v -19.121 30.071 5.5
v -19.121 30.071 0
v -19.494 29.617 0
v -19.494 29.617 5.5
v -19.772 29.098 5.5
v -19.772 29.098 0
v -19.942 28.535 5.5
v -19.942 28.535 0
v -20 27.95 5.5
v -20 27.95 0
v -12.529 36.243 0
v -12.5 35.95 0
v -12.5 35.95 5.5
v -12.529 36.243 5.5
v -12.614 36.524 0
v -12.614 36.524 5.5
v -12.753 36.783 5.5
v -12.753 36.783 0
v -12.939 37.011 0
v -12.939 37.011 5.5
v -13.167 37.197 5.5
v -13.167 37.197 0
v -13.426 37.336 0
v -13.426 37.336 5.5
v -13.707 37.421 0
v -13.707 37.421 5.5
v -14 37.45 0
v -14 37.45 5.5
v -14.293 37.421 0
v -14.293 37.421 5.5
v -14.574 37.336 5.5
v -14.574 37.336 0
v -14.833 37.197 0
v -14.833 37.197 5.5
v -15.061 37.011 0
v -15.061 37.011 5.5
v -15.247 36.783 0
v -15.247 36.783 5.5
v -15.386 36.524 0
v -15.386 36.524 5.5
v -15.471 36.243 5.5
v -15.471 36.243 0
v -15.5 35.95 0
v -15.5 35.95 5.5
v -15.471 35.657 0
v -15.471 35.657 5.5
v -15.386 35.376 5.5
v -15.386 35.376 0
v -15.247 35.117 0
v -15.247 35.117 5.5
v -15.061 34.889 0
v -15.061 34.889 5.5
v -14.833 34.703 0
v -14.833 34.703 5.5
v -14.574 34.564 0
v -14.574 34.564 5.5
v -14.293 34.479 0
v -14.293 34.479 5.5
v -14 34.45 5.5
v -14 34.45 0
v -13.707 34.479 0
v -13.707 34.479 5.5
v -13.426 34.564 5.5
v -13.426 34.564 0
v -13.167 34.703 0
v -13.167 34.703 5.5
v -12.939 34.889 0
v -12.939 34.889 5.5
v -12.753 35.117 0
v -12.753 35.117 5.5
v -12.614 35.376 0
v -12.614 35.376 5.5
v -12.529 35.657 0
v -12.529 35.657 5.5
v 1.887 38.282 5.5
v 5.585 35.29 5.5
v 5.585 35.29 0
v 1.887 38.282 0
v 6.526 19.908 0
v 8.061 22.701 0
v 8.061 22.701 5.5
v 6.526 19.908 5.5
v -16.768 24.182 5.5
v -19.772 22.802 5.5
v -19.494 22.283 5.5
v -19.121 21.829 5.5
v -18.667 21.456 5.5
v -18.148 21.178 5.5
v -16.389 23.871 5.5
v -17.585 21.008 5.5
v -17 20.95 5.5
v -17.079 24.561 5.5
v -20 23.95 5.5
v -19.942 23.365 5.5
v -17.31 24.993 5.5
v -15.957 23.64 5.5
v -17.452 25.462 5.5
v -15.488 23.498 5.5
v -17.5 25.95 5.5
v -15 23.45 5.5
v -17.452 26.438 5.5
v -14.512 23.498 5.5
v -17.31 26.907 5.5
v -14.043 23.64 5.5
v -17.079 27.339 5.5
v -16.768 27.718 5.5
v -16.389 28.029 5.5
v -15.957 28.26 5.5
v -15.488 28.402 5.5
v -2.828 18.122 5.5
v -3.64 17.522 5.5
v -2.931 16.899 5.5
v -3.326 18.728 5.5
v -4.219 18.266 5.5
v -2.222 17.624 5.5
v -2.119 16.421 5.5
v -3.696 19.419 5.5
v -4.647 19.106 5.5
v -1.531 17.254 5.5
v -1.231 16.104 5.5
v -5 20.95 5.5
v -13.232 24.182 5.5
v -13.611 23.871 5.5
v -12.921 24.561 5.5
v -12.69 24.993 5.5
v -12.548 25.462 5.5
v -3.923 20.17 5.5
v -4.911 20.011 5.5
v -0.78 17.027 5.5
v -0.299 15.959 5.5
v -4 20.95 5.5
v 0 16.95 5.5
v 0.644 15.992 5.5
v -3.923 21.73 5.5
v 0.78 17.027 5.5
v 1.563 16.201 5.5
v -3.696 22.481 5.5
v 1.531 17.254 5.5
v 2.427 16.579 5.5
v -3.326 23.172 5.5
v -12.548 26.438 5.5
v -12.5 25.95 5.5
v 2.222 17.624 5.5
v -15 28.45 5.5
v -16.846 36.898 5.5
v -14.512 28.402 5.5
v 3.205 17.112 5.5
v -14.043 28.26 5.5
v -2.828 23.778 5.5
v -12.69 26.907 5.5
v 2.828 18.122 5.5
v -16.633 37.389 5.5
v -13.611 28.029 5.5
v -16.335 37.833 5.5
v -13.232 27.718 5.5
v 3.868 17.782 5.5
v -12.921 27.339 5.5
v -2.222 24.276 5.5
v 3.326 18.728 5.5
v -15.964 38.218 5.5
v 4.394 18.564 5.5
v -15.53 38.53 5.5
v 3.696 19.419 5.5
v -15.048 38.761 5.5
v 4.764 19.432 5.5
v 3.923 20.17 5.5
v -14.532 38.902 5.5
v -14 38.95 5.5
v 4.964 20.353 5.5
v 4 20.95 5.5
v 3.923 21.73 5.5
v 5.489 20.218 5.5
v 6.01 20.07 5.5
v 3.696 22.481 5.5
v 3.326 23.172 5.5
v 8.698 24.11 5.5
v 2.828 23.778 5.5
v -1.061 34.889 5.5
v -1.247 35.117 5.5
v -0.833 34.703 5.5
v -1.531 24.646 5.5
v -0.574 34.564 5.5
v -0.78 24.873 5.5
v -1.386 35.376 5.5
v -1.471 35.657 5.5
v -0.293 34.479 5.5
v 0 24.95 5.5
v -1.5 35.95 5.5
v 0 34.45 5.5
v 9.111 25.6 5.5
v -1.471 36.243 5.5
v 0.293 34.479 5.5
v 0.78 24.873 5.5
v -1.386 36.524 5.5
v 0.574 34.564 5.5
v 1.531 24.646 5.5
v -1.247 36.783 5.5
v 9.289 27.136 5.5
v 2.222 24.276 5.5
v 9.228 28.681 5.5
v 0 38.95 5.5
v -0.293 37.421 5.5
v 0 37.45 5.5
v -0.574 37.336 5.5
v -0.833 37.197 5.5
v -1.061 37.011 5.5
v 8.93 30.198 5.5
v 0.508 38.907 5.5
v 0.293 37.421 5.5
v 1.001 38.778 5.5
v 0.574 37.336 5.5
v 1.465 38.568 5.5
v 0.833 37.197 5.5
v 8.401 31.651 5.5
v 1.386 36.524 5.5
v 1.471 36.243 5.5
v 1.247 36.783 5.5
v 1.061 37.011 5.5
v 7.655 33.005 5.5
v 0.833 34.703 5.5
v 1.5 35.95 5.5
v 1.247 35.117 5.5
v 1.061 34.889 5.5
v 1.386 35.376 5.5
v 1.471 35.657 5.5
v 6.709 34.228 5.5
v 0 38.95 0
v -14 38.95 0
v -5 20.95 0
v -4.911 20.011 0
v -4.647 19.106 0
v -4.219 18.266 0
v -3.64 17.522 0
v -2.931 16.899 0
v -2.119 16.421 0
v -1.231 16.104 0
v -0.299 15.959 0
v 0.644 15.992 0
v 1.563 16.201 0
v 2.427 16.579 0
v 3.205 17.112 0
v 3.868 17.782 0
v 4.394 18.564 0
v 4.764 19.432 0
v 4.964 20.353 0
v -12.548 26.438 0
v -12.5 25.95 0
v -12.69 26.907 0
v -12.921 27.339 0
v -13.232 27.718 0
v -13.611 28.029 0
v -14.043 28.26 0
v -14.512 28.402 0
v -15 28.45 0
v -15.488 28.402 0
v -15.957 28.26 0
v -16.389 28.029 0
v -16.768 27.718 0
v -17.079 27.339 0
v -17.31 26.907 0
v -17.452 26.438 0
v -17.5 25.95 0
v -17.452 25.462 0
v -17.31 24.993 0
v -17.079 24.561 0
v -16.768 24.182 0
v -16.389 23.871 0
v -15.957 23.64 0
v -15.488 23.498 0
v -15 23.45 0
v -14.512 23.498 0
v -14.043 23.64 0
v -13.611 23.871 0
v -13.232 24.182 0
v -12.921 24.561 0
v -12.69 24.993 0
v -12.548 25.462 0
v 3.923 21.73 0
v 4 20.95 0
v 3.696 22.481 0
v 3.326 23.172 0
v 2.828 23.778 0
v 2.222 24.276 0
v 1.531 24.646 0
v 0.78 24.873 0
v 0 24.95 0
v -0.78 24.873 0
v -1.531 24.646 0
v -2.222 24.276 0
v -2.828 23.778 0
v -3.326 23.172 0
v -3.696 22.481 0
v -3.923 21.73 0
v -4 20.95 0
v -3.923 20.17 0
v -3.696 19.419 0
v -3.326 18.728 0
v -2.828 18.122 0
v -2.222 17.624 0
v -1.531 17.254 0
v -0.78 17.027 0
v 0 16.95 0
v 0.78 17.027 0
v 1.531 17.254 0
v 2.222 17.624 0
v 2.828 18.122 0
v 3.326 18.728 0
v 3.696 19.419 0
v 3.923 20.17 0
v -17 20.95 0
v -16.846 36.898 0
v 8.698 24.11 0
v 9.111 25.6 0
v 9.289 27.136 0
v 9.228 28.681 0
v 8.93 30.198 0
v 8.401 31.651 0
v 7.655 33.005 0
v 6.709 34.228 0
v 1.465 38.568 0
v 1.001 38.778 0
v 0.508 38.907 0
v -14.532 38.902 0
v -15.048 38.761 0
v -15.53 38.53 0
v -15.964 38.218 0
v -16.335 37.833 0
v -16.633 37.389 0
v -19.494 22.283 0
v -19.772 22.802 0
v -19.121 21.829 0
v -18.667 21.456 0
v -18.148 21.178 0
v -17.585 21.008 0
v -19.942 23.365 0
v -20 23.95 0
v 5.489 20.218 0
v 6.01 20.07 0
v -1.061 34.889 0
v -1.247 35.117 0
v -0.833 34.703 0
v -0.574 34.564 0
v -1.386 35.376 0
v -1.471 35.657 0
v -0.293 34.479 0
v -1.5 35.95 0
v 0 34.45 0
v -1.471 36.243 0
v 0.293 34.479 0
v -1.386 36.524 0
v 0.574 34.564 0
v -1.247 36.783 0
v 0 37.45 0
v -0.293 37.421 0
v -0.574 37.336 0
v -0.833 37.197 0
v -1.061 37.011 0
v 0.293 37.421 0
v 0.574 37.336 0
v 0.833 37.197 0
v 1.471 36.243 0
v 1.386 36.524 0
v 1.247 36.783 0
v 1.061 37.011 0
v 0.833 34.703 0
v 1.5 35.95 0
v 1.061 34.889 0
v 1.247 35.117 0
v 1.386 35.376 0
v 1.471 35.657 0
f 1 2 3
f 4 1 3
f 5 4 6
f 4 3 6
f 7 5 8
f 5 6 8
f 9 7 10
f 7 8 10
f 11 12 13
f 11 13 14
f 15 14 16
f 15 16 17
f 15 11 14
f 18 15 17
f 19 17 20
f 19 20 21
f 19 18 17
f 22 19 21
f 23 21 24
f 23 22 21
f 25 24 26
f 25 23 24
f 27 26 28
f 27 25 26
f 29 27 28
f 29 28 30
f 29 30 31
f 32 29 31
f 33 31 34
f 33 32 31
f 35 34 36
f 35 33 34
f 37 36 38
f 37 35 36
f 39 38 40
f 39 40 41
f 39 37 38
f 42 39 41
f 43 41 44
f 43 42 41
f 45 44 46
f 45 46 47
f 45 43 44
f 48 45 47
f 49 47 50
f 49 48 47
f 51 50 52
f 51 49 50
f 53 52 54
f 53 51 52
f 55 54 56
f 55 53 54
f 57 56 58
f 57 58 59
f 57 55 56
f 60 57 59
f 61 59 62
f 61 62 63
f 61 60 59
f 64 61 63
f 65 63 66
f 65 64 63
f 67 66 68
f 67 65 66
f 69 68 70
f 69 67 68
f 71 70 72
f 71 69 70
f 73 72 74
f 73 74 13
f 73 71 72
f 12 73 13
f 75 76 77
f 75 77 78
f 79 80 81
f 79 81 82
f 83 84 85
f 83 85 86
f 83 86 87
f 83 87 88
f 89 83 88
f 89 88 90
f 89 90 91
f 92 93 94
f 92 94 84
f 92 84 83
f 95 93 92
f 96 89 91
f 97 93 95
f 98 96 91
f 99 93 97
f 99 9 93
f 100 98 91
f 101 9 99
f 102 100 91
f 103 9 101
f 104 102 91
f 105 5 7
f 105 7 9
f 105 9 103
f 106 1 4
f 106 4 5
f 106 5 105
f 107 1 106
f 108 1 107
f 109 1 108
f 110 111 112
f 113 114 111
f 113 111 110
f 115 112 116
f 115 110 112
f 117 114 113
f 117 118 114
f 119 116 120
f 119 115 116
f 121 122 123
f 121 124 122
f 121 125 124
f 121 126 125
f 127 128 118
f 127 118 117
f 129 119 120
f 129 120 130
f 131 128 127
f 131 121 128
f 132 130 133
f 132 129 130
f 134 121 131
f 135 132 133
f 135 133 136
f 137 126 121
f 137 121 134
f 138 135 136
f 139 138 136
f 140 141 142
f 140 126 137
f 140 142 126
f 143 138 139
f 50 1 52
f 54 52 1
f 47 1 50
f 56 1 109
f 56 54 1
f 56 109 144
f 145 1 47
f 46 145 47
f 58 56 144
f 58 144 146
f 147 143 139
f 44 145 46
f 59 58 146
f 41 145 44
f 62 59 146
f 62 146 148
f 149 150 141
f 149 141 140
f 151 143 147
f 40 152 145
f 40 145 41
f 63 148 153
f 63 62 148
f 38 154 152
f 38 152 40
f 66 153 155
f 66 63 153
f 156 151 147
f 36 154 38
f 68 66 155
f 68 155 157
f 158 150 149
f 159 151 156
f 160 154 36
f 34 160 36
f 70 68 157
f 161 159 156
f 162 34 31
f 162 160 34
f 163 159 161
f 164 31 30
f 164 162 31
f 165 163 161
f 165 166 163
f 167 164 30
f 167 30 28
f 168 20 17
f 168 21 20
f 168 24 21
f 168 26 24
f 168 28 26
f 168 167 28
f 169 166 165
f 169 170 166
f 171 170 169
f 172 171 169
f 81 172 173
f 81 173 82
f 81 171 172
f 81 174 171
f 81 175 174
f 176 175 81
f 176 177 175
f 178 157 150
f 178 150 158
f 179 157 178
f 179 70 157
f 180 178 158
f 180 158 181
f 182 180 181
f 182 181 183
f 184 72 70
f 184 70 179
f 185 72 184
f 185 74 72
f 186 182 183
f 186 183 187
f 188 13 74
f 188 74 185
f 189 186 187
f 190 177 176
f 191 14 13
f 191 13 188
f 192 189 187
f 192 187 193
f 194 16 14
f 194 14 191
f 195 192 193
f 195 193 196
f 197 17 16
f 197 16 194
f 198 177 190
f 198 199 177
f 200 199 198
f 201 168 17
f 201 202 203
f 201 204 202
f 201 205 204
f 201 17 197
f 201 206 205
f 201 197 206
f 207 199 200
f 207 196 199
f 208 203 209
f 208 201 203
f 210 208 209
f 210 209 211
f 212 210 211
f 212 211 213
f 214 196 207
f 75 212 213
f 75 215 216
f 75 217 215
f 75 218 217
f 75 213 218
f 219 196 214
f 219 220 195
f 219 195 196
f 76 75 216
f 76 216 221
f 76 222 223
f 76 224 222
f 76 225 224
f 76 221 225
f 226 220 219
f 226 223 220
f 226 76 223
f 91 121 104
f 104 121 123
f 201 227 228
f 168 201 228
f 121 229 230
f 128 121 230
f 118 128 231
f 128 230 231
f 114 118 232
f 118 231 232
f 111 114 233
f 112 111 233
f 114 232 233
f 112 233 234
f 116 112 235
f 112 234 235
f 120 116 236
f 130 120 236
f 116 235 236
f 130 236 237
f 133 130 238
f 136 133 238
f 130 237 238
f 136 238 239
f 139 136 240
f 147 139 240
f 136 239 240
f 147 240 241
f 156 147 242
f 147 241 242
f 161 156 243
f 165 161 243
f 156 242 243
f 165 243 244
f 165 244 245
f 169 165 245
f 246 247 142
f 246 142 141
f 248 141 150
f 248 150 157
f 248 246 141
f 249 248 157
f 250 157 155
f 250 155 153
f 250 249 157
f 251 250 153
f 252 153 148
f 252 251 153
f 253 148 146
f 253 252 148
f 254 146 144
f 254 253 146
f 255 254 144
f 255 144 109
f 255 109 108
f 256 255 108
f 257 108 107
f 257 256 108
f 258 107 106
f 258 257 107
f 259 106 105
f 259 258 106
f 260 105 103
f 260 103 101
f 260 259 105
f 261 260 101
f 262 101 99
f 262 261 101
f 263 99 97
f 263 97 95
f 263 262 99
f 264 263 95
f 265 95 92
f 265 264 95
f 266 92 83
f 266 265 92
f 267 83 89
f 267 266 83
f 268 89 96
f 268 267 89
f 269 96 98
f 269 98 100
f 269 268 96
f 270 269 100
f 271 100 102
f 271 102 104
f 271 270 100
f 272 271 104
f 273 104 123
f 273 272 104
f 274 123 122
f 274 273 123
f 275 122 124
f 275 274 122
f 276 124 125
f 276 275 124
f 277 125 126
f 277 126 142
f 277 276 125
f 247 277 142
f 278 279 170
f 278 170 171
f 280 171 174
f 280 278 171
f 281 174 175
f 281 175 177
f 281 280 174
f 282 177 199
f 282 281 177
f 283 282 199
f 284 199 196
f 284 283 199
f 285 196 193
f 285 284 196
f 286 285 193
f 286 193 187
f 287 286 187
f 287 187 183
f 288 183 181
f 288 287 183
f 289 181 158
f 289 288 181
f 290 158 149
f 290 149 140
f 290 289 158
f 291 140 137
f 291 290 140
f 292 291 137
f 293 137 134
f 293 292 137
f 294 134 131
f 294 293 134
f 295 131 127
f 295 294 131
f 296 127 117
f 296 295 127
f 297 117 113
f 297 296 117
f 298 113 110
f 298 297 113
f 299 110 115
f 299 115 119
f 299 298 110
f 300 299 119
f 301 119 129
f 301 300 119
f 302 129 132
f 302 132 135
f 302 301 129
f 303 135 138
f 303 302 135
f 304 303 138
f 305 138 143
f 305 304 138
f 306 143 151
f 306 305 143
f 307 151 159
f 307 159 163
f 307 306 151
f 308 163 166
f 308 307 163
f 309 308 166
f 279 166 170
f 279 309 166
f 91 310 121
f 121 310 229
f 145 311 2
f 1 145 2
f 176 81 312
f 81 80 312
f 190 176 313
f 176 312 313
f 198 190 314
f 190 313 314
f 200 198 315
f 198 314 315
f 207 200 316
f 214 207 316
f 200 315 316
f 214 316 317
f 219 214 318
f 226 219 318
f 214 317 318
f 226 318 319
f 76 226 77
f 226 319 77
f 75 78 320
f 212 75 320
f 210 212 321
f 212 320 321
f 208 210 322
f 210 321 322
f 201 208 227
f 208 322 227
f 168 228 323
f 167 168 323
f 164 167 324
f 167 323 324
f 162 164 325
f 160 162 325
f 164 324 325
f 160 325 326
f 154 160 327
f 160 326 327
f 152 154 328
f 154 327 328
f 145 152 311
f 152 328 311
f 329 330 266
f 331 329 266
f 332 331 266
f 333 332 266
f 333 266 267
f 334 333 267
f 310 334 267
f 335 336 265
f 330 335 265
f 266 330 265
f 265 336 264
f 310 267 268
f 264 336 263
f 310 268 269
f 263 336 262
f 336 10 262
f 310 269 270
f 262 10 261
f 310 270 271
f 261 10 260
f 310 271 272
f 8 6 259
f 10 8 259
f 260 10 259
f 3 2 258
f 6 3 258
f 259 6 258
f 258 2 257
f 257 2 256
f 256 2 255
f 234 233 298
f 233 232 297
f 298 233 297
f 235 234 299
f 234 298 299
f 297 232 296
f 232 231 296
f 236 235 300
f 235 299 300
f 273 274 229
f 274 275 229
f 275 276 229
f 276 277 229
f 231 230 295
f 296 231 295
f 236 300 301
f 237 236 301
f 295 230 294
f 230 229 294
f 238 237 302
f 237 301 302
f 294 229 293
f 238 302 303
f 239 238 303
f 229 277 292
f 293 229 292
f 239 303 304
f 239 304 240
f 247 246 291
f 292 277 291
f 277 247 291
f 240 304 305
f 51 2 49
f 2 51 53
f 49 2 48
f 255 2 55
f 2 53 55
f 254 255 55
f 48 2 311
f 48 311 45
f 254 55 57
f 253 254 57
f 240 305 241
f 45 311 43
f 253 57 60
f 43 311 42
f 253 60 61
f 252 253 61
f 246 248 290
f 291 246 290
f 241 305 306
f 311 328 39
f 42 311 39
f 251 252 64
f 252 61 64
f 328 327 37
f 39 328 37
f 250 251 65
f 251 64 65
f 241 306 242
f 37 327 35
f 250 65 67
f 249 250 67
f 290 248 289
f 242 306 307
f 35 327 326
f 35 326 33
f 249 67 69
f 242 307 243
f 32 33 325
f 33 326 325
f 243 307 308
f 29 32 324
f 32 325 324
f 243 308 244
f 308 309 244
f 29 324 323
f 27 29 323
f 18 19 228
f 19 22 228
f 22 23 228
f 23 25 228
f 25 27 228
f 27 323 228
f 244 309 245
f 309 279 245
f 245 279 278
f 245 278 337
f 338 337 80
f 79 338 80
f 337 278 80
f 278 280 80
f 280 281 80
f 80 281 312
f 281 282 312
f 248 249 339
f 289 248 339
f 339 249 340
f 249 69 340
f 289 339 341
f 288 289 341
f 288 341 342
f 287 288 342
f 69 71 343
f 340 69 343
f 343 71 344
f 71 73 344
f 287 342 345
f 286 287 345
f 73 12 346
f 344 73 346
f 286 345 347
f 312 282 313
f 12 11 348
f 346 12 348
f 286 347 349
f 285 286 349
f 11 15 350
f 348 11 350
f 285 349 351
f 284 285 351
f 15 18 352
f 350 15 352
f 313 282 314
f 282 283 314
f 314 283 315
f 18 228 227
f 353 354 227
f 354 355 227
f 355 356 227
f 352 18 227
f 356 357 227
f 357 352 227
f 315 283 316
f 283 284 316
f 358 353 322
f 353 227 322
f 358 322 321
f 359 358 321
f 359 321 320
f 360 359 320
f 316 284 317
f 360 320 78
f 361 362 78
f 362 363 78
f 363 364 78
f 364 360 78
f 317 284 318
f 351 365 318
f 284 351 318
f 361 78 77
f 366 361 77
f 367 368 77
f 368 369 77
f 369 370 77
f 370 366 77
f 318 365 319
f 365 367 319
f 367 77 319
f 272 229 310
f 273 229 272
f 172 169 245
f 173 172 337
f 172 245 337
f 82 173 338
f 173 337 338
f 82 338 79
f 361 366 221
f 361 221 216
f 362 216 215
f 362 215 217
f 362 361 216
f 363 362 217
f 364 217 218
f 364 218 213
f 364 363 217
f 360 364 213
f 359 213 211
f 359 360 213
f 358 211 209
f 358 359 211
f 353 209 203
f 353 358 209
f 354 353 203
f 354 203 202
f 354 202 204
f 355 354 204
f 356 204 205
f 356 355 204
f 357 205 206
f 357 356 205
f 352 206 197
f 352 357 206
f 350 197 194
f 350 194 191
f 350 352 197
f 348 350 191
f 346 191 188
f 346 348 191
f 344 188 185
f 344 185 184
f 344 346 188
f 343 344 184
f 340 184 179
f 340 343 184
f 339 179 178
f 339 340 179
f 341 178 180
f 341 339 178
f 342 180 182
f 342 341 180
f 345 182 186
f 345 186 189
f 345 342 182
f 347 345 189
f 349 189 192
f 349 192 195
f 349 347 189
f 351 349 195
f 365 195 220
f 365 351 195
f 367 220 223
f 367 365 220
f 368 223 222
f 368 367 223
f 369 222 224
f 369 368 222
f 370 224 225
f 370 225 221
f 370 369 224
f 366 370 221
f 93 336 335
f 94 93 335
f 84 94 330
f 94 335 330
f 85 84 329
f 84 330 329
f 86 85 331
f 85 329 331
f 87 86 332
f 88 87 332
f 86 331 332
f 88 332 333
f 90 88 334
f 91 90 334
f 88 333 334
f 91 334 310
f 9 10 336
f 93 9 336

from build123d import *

# Parameters (mm, degrees)
CROQUIS1_R              = 4
CROQUIS1_R_2            = 2.5
CROQUIS1_R_3            = 1.5
SALIENTE_EXTRUIR1_DEPTH = 5.5
CORTAR_EXTRUIR1_DEPTH   = 10
REDONDEO1_R             = 10


with BuildPart() as part:
    # Croquis1 → Saliente-Extruir1 (new body)
    with BuildSketch(Plane.XY):
        with BuildLine():
            ThreePointArc((13.175908043, 16.287969402), (20.207859701, 17.03070481), (19.465124293, 24.062656467))
            Line((19.465124293, 24.062656467), (1.886764875, 38.28240612))
            ThreePointArc((1.886764875, 38.28240612), (1.000695169, 38.778181249), (0, 38.95))
            Line((0, 38.95), (-14, 38.95))
            ThreePointArc((-14, 38.95), (-15.75421382, 38.383666755), (-16.84611457, 36.898489248))
            Line((-16.84611457, 36.898489248), (-19.121320344, 30.071320344))
            ThreePointArc((-19.121320344, 30.071320344), (-19.771638598, 29.098050297), (-20, 27.95))
            Line((-20, 27.95), (-20, 23.95))
            ThreePointArc((-20, 23.95), (-19.121320344, 21.828679656), (-17, 20.95))
            Line((-17, 20.95), (-5, 20.95))
            ThreePointArc((-5, 20.95), (-0.298863721, 15.958939945), (4.964272191, 20.353341289))
            ThreePointArc((4.964272191, 20.353341289), (9.295071106, 18.775093958), (13.175908043, 16.287969402))
        make_face()
        with Locations((0, 20.95)):
            Circle(CROQUIS1_R, mode=Mode.SUBTRACT)
        with Locations((-15, 25.95)):
            Circle(CROQUIS1_R_2, mode=Mode.SUBTRACT)
        with Locations((0, 35.95)):
            Circle(CROQUIS1_R_3, mode=Mode.SUBTRACT)
        with Locations((-14, 35.95)):
            Circle(CROQUIS1_R_3, mode=Mode.SUBTRACT)
    extrude(amount=SALIENTE_EXTRUIR1_DEPTH)

    # Croquis2 → Cortar-Extruir1 (cut)
    with BuildSketch(Plane.XY.offset(5.5)):
        with BuildLine():
            Line((12.087138576, 30.030967124), (6.52630373, 19.907532736))
            ThreePointArc((6.52630373, 19.907532736), (10.015967096, 18.400622357), (13.175908043, 16.287969402))
            ThreePointArc((13.175908043, 16.287969402), (20.207859701, 17.03070481), (19.465124293, 24.062656467))
            Line((19.465124293, 24.062656467), (12.087138576, 30.030967124))
        make_face()
    extrude(amount=-CORTAR_EXTRUIR1_DEPTH, mode=Mode.SUBTRACT)

    # Redondeo1
    redondeo1_edges = [part.edges().sort_by_distance(p)[0] for p in [
        (12.087138576, 30.030967124, 2.75),
    ]]
    fillet(redondeo1_edges, radius=REDONDEO1_R)


solid = part.part
